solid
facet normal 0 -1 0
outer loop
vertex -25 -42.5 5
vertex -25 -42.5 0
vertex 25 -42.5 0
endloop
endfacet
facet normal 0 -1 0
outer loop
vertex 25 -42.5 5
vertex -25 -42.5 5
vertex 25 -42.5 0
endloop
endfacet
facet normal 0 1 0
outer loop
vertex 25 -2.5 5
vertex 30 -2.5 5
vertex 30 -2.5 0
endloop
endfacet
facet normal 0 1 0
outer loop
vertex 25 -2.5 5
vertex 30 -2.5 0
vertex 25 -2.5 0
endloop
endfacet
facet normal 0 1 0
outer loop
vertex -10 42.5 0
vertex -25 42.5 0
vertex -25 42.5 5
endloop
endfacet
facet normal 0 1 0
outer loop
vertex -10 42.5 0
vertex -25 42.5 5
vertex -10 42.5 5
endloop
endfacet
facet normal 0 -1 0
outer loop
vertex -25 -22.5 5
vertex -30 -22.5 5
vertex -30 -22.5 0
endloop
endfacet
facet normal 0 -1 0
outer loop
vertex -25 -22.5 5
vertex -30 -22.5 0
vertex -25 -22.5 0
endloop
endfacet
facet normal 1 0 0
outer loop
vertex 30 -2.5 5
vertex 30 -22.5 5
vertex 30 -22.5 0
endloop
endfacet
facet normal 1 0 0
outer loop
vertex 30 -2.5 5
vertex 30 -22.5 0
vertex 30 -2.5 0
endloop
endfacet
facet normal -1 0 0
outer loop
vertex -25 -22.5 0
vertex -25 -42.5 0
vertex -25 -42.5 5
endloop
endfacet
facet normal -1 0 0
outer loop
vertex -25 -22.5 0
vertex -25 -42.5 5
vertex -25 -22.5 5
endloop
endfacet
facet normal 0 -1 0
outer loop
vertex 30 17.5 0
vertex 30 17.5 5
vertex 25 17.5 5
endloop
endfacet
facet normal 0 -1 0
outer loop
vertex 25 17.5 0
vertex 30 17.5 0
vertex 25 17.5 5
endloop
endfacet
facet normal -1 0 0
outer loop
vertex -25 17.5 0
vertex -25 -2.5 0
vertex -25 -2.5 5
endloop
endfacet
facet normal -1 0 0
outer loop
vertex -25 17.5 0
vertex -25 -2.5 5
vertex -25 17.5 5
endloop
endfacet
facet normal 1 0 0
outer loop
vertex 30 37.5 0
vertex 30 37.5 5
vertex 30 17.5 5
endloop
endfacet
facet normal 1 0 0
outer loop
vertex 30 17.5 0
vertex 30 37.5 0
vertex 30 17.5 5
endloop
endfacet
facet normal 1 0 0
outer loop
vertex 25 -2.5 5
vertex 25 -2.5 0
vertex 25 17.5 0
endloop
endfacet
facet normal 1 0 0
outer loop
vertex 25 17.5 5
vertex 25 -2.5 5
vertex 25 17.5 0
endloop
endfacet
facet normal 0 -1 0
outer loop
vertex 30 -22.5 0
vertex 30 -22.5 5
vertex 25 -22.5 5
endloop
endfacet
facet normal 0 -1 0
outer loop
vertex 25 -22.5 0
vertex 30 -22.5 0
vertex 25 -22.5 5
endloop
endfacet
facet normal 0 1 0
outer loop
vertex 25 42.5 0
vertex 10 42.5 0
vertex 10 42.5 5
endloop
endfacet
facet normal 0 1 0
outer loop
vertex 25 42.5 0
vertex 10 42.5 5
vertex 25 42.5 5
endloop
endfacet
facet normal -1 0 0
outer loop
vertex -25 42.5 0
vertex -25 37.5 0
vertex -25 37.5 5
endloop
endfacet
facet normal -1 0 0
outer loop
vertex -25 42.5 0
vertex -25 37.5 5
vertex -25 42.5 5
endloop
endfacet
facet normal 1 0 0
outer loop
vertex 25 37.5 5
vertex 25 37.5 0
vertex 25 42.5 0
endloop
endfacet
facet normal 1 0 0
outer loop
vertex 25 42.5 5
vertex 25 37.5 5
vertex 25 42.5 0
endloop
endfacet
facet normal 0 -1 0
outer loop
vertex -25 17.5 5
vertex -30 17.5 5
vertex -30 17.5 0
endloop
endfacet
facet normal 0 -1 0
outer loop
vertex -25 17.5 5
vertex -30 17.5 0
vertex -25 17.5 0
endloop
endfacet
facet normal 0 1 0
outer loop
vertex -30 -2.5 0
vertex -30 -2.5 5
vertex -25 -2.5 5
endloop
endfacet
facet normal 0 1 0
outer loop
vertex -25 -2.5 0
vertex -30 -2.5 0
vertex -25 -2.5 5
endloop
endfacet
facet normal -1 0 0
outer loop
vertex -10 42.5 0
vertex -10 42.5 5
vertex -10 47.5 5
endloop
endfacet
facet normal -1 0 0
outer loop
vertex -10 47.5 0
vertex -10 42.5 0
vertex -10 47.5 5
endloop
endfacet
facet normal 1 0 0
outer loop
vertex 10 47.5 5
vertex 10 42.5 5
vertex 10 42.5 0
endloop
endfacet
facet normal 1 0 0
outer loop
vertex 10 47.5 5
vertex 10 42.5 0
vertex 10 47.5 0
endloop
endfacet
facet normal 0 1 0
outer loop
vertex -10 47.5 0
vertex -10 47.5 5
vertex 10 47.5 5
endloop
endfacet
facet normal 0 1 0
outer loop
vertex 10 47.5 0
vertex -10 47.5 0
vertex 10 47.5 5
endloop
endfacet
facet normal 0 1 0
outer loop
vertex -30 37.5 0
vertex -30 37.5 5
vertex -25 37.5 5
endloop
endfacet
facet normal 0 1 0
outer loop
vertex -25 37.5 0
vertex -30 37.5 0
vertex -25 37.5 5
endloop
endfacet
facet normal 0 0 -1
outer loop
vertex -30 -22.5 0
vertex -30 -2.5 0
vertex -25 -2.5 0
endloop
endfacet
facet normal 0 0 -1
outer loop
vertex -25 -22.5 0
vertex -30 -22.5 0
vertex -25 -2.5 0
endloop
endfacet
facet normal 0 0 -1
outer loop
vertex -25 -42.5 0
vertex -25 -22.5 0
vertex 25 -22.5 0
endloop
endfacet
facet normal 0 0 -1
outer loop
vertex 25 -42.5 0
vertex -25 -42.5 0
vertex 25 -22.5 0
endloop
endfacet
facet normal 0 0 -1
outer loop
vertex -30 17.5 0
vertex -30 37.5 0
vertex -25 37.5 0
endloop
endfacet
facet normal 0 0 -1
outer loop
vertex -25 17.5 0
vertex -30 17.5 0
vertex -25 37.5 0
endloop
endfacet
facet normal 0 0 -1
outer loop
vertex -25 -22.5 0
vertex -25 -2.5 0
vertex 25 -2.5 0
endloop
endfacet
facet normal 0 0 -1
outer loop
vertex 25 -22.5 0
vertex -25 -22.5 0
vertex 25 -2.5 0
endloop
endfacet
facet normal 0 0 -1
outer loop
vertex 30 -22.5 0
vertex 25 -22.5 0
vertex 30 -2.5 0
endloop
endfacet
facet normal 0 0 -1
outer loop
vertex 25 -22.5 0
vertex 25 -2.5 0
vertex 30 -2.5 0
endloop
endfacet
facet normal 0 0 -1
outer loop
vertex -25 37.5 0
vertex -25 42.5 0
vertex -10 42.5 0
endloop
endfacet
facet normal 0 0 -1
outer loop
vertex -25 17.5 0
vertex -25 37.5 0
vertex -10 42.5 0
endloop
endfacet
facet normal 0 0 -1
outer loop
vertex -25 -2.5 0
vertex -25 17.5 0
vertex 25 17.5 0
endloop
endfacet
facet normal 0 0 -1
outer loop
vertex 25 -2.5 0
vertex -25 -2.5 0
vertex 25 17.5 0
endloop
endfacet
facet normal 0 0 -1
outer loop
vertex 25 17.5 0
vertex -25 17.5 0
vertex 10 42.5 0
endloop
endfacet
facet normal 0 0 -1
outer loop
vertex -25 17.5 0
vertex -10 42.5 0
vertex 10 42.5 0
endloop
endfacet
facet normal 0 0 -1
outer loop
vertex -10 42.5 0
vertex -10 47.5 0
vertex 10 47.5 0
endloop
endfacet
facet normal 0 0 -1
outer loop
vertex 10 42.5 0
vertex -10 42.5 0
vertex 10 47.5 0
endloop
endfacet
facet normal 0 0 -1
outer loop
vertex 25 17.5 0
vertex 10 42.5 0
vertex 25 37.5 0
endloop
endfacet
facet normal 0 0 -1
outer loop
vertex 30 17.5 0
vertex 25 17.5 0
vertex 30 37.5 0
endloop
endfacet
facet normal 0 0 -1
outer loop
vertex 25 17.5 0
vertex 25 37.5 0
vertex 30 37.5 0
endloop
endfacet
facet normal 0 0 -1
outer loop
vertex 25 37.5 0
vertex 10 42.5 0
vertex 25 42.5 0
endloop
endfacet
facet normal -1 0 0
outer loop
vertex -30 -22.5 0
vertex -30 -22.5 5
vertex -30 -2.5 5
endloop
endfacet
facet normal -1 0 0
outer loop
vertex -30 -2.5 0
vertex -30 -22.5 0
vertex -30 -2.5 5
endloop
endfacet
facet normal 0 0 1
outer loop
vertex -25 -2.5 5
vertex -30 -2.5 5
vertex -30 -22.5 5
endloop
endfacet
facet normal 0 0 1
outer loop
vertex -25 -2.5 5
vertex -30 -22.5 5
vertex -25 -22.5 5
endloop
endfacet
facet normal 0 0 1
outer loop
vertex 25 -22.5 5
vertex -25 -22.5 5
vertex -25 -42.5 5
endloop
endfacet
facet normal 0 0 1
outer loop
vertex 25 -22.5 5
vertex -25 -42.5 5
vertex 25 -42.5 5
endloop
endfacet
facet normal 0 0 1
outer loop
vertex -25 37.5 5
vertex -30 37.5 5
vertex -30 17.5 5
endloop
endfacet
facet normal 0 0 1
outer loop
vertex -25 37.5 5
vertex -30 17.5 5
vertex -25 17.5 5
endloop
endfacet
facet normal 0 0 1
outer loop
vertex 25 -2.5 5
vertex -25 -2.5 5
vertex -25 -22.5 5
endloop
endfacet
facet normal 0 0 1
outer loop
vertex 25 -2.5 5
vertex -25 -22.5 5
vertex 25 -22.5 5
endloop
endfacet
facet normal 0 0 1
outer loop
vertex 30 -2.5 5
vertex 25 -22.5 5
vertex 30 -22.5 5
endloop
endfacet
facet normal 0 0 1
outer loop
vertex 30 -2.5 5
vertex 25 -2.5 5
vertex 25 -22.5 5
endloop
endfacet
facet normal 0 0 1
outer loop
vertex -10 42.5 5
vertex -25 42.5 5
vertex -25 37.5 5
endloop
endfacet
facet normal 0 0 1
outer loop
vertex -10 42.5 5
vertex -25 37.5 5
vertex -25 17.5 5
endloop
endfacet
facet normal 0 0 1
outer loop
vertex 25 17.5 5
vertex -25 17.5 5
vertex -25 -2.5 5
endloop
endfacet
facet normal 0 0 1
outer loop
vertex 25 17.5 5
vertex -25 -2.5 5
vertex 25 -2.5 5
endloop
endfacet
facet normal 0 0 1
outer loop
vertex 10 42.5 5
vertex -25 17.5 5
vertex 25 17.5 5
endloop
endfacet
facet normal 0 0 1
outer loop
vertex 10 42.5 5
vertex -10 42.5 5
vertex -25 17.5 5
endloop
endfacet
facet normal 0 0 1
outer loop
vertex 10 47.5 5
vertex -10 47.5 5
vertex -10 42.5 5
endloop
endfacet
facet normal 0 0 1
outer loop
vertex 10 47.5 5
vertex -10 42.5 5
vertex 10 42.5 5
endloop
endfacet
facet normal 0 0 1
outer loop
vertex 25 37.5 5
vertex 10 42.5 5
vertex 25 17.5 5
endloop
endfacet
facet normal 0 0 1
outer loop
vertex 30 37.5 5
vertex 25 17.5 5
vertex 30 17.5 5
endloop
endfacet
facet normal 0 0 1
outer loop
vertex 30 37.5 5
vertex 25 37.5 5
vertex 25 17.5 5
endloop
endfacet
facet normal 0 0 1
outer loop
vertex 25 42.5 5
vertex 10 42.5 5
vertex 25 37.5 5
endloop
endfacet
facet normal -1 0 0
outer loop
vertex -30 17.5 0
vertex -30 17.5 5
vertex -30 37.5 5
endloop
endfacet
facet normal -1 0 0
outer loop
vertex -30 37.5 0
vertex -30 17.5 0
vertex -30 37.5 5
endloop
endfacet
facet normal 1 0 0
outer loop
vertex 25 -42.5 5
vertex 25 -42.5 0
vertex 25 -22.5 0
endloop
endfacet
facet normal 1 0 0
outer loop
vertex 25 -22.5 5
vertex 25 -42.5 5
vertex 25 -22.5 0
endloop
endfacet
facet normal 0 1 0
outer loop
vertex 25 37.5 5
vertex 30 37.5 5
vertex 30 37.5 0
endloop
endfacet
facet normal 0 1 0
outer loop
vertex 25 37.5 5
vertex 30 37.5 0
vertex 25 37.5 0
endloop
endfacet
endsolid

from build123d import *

# Parameters (mm, degrees)
SKETCH_1_W               = 50
SKETCH_1_H               = 85
EXTRUDE_1_DEPTH          = 5
SKETCH_2_W               = 5
SKETCH_2_H               = 20
EXTRUDE_2_DEPTH          = 5
PATTERN_LINEAR_1_COUNT   = 2
PATTERN_LINEAR_1_PITCH   = 40
MIRROR_1_COPY_1_SKETCH_W = 5
MIRROR_1_COPY_1_SKETCH_H = 20
MIRROR_1_COPY_1_DEPTH    = 5
SKETCH_4_W               = 20
SKETCH_4_H               = 5
EXTRUDE_3_DEPTH          = 5


with BuildPart() as part:
    # 스케치1 → 보스-돌출1 (new body)
    with BuildSketch(Plane.XY):
        Rectangle(SKETCH_1_W, SKETCH_1_H)
    extrude(amount=EXTRUDE_1_DEPTH)

    # 스케치2 → 보스-돌출2 (add)
    with BuildSketch(Plane.XY.offset(5)):
        with Locations((-27.5, -12.5)):
            Rectangle(SKETCH_2_W, SKETCH_2_H)
    extrude_2 = extrude(amount=-EXTRUDE_2_DEPTH)

    # 선형 패턴1: 보스-돌출2 ×2
    with Locations(*[(0, i * PATTERN_LINEAR_1_PITCH, 0) for i in range(1, PATTERN_LINEAR_1_COUNT)]):
        add(extrude_2)

    # 대칭 복사1: 보스-돌출2 across plane
    add(extrude_2.mirror(Plane(origin=(0, 0, 0), x_dir=(0, 0, 1), z_dir=(1, 0, 0))))

    # 대칭 복사1 copy 1 sketch → 대칭 복사1 copy 1 (add)
    with BuildSketch(Plane(origin=(0, 40, 5), x_dir=(-1, 0, 0), z_dir=(0, 0, 1))):
        with Locations((-27.5, 12.5)):
            Rectangle(MIRROR_1_COPY_1_SKETCH_W, MIRROR_1_COPY_1_SKETCH_H)
    extrude(amount=-MIRROR_1_COPY_1_DEPTH)

    # 스케치4 → 보스-돌출3 (add)
    with BuildSketch(Plane.XY.offset(5)):
        with Locations((0, 45)):
            Rectangle(SKETCH_4_W, SKETCH_4_H)
    extrude(amount=-EXTRUDE_3_DEPTH)


solid = part.part
